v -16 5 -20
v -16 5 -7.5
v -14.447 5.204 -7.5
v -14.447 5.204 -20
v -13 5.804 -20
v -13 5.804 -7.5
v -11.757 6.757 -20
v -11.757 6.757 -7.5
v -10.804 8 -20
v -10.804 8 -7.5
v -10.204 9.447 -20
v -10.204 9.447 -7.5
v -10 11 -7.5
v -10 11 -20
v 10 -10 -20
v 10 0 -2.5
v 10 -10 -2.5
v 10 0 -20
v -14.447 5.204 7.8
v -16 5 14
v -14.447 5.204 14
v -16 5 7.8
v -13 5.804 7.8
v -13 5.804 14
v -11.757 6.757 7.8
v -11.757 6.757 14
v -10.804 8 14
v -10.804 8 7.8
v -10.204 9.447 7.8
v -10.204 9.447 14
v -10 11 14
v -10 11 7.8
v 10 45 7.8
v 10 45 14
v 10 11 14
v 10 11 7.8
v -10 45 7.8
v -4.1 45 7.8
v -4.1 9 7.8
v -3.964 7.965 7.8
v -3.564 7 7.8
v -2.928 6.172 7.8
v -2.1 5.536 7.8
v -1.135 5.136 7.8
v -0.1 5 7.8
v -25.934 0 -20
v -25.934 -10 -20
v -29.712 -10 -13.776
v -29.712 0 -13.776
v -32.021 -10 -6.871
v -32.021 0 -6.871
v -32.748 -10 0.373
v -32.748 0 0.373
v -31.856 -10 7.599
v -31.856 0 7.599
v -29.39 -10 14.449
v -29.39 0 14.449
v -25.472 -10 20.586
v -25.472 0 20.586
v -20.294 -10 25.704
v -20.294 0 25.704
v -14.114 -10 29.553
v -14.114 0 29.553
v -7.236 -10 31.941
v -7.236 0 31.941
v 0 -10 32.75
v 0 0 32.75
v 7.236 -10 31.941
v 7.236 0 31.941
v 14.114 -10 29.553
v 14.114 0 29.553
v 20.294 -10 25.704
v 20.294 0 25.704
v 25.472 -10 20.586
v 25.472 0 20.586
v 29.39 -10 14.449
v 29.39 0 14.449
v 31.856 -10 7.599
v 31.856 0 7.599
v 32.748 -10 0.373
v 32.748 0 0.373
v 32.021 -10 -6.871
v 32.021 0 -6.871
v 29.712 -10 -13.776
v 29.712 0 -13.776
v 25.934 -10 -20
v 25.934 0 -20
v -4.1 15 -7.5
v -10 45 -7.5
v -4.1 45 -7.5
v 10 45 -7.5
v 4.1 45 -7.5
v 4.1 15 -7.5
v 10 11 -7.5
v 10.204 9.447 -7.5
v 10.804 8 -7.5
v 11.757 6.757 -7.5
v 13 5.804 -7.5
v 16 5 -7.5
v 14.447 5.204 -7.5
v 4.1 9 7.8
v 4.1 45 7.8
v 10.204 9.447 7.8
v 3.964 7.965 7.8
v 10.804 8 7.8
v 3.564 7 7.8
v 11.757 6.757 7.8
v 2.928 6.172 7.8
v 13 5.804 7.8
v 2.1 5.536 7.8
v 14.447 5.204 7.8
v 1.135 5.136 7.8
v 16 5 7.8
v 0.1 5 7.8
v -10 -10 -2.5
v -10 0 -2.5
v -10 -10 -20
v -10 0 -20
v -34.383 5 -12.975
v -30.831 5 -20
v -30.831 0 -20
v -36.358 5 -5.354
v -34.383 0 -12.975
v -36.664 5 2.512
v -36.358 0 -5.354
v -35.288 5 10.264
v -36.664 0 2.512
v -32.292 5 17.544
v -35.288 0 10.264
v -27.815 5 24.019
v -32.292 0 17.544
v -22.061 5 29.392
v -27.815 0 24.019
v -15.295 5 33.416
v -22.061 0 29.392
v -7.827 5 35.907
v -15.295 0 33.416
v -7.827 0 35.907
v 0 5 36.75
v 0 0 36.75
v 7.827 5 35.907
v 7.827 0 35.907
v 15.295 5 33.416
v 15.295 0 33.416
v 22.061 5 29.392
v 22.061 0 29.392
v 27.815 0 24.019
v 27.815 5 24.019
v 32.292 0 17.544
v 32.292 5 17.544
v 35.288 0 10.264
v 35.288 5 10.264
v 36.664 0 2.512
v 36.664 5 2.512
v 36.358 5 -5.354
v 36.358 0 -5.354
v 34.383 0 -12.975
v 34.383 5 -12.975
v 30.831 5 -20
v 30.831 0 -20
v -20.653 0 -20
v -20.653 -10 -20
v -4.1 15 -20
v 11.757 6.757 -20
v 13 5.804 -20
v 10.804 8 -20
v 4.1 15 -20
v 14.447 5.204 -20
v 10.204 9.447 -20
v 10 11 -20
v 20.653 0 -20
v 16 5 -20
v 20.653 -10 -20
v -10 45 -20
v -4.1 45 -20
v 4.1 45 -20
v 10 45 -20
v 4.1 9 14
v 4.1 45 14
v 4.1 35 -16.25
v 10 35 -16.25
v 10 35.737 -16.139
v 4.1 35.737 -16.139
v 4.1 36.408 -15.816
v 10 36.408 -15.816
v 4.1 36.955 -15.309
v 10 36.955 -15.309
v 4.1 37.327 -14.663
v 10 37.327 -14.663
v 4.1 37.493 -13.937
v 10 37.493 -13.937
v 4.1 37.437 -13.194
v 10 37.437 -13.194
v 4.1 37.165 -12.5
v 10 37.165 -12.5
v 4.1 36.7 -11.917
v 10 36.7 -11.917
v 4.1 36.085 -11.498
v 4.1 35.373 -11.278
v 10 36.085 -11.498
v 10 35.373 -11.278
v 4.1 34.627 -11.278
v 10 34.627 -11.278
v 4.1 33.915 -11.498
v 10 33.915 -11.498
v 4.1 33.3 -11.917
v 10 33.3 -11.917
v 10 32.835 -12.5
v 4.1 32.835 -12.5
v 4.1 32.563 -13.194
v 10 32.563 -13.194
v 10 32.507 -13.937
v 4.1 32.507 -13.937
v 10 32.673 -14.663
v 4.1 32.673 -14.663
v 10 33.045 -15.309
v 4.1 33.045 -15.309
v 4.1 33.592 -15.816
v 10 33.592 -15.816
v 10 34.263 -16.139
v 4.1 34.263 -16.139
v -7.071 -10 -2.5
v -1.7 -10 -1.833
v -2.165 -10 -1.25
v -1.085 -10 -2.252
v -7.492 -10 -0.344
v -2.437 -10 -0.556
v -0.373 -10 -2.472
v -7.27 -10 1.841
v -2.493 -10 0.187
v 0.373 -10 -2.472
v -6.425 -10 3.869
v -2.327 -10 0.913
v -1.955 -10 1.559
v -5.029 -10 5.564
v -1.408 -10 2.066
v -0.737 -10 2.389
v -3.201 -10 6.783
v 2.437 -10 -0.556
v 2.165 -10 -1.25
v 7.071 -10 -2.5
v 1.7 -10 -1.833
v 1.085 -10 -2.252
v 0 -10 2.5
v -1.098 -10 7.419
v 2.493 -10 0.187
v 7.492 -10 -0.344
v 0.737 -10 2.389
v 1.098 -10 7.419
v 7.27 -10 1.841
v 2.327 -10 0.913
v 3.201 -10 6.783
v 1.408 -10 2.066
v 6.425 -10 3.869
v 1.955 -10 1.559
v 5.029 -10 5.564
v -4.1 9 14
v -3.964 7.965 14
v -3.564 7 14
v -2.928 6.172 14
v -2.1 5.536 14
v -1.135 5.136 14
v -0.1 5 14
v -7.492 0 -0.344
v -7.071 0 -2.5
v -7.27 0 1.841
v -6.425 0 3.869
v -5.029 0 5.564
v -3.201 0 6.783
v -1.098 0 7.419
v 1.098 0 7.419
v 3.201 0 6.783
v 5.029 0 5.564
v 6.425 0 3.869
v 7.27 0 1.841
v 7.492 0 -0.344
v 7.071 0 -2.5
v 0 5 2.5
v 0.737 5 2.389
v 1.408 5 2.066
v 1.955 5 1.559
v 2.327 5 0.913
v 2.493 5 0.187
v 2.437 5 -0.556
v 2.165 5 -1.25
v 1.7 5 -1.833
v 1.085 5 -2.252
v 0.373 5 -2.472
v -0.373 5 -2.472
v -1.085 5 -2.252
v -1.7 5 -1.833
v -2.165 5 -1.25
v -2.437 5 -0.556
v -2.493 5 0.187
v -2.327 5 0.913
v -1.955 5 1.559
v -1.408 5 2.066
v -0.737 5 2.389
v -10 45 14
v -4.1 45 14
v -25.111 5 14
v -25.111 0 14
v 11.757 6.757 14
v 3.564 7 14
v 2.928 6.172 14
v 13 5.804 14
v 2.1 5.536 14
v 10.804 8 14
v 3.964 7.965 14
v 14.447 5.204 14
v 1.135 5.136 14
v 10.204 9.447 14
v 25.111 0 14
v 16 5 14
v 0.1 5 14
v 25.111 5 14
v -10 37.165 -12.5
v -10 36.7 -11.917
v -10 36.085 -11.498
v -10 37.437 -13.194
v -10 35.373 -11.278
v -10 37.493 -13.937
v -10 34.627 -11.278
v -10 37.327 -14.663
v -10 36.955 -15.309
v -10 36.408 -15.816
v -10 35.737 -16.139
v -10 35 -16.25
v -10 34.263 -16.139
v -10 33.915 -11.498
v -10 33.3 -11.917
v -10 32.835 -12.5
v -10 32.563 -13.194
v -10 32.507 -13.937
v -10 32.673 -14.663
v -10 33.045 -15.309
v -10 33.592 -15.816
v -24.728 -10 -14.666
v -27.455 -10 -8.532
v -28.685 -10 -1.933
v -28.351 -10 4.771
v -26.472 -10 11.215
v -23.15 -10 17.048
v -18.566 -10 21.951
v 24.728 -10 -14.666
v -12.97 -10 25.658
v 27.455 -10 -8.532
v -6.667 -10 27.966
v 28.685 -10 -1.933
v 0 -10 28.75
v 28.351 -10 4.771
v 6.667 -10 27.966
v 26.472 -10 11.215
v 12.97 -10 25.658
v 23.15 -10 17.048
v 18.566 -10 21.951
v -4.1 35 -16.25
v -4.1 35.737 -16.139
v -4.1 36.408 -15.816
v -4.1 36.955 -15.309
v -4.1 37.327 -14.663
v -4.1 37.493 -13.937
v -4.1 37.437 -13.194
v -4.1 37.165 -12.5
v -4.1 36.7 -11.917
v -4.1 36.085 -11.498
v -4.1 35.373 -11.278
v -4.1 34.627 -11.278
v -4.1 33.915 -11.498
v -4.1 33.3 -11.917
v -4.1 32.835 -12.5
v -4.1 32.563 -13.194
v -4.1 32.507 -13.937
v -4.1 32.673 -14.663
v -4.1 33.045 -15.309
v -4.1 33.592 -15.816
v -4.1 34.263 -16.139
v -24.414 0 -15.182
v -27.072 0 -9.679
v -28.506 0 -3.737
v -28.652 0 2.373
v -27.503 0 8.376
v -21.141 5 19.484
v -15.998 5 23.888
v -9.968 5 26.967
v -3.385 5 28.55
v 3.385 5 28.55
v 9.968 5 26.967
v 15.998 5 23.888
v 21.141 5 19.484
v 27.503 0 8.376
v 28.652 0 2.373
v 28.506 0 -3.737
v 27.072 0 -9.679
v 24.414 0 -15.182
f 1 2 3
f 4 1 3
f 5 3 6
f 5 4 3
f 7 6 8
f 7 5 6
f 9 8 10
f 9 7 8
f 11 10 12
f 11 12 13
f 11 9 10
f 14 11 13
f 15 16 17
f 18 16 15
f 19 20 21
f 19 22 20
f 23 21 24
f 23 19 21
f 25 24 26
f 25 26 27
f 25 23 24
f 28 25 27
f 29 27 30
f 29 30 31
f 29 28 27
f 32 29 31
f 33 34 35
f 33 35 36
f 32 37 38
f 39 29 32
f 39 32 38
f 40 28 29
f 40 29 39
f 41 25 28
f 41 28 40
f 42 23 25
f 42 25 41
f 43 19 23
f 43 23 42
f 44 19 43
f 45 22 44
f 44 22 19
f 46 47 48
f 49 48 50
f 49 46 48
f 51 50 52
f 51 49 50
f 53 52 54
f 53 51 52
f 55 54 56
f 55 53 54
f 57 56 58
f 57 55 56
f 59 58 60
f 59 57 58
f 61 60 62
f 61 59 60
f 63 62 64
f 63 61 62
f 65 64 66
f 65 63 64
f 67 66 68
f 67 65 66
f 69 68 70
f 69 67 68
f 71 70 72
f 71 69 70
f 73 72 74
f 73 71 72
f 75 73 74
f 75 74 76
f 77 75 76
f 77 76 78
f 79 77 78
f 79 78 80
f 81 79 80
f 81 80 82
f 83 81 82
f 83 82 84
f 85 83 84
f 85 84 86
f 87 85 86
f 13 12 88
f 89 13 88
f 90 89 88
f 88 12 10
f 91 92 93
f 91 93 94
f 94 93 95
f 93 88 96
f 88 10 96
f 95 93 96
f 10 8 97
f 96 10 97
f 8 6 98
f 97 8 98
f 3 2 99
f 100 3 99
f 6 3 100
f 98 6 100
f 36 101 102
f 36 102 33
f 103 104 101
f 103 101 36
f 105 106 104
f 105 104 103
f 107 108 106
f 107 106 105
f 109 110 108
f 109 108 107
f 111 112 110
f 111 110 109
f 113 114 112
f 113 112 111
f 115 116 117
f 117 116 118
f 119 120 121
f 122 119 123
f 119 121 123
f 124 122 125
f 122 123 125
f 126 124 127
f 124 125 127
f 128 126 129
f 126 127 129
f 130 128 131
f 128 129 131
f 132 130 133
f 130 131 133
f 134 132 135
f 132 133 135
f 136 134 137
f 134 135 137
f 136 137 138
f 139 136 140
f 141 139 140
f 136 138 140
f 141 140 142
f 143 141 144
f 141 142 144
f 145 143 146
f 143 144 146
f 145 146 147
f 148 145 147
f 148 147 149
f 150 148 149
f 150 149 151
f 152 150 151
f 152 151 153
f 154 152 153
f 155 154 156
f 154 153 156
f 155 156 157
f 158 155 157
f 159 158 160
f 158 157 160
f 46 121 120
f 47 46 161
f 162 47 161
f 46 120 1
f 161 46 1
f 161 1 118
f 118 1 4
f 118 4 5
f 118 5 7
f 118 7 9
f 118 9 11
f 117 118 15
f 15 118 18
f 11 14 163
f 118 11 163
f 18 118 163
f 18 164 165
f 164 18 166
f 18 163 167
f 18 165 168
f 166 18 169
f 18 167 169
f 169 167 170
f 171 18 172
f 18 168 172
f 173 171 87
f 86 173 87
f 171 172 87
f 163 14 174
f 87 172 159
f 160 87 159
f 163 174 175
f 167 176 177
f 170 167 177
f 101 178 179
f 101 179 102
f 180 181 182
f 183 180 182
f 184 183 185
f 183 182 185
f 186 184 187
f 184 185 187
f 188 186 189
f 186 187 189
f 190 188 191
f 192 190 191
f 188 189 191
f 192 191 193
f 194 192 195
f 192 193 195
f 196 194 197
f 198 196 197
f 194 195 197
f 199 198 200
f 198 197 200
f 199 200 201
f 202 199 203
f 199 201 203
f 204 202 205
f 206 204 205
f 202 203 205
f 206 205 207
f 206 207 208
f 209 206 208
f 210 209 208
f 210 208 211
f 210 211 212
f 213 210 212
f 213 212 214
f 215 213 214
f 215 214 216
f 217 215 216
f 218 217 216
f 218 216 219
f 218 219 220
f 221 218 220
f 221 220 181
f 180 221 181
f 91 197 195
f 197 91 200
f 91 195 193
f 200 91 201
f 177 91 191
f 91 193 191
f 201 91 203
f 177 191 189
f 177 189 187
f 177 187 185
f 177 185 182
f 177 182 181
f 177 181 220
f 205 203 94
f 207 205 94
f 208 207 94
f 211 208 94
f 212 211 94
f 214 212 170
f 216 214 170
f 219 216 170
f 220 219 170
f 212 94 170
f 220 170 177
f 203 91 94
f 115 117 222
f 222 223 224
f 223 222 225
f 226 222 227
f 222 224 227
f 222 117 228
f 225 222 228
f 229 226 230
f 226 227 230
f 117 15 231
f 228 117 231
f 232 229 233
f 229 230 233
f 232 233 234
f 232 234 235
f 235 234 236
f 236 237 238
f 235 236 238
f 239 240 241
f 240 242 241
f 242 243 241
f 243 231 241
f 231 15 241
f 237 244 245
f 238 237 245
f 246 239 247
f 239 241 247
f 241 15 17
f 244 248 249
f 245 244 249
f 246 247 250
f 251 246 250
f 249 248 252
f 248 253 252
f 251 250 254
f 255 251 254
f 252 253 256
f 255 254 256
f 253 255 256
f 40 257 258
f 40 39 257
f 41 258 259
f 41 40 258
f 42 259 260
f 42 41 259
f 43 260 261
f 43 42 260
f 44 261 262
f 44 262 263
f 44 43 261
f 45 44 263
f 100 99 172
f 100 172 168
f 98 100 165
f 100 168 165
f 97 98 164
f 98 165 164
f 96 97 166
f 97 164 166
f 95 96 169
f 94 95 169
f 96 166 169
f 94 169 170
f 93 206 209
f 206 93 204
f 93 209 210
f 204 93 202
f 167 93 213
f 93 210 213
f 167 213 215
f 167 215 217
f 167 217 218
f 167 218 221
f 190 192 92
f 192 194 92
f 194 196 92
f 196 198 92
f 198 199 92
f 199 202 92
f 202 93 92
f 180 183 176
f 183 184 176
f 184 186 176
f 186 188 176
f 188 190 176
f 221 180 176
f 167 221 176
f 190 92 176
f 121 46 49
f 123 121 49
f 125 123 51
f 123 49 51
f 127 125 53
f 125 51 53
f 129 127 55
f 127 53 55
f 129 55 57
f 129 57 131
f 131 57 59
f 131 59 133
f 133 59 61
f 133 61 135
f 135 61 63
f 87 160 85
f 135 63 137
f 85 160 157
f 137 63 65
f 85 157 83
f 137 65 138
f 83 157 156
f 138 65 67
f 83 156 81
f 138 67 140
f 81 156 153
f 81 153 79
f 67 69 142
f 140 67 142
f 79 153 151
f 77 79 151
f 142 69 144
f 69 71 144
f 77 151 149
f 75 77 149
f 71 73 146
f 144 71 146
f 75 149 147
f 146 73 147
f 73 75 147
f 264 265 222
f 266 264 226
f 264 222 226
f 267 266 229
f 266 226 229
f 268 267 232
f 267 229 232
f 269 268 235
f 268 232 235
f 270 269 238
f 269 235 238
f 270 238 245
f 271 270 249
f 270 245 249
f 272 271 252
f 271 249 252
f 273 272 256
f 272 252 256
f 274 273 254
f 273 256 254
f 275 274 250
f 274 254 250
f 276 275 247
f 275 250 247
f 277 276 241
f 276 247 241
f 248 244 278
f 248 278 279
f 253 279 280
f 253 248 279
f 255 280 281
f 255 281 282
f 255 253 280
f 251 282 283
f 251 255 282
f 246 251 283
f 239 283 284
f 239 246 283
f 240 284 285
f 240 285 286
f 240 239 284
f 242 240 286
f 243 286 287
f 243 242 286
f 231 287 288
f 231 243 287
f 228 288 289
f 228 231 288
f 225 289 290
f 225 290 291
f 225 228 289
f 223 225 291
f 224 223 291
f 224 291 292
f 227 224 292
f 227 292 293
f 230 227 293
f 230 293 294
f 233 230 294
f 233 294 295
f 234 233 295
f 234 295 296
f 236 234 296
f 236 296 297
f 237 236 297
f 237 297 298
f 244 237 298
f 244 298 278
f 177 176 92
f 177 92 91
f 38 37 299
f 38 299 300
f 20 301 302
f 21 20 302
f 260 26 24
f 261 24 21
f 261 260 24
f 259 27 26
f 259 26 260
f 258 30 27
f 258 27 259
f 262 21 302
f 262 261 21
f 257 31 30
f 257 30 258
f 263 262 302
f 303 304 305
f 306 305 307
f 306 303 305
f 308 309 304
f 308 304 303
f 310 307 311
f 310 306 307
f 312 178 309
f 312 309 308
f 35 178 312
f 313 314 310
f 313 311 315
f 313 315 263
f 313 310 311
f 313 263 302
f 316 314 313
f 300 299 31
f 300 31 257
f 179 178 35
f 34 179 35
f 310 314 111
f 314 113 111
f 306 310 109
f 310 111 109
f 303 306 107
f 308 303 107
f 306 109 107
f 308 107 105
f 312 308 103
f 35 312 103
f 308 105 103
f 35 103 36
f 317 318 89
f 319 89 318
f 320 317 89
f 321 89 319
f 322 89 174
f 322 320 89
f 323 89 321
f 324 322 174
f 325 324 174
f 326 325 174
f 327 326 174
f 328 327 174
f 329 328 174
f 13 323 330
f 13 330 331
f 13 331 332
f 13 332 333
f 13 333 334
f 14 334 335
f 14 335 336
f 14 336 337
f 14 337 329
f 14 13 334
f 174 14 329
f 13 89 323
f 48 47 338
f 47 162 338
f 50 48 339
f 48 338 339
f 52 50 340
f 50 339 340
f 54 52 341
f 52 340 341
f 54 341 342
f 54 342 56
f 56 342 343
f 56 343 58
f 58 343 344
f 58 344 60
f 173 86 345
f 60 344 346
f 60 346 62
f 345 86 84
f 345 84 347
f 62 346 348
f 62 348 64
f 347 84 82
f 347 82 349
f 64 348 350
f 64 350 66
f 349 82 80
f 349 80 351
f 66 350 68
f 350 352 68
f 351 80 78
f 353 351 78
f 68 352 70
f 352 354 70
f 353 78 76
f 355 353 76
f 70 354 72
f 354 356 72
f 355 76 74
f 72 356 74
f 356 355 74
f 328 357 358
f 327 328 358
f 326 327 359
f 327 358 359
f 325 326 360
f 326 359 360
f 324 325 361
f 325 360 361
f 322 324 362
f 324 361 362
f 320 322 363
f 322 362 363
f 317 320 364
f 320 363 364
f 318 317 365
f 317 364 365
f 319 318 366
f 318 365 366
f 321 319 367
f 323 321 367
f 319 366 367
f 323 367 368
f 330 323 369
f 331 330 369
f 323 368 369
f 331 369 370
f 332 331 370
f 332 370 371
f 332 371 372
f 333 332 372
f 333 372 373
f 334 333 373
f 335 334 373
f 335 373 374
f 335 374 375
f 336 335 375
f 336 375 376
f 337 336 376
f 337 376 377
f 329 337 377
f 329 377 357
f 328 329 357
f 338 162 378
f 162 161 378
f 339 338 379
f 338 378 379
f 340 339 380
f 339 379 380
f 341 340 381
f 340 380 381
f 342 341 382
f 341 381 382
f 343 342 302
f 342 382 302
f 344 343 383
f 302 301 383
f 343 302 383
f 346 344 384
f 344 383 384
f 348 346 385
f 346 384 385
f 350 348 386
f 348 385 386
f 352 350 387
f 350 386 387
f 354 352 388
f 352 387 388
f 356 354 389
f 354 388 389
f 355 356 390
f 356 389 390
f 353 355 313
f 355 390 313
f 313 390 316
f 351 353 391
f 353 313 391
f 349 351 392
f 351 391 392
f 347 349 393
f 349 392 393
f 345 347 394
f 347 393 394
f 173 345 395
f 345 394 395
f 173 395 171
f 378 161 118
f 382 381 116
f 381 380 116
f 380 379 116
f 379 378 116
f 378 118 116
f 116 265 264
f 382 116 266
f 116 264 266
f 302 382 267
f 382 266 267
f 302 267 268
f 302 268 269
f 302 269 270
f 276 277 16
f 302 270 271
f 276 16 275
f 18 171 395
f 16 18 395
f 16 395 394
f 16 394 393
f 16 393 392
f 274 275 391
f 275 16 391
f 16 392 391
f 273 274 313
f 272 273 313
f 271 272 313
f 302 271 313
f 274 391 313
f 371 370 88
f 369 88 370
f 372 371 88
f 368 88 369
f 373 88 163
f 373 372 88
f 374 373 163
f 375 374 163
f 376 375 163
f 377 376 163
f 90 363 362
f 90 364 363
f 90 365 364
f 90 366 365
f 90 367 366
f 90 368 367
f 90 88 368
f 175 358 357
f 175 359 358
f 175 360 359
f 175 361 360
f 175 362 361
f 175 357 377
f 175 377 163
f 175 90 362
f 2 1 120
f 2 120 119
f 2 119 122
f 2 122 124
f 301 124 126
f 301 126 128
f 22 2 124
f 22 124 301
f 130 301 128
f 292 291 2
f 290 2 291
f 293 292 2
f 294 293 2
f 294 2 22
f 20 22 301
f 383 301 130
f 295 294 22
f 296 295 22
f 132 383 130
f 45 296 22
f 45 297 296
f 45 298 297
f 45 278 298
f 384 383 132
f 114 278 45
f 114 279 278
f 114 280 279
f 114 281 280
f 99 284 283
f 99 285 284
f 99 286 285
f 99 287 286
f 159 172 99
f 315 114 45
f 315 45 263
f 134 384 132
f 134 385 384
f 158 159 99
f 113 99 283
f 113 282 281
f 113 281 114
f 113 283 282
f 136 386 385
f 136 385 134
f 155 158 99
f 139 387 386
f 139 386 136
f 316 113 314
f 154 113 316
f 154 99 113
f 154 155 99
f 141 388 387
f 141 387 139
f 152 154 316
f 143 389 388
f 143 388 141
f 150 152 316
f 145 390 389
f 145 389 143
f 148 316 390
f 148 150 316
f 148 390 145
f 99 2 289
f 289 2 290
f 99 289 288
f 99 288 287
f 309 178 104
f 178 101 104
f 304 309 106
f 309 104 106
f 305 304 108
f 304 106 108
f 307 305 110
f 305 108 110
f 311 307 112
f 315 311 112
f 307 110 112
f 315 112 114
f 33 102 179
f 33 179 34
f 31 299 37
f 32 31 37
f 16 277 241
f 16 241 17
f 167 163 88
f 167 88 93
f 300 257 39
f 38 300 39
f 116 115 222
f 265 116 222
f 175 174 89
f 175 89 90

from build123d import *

# Parameters (mm, degrees)
CYLINDER_DEPTH                  = 5
CYLINDER_DEPTH_BACK             = 10
SKETCH_1_R                      = 7.5
SKETCH_1_R_2                    = 2.5
SKETCH_2_R                      = 36.75
SKETCH_2_R_2                    = 2.5
BASE_HORIZONT_DEPTH             = 5
SKETCH_3_R                      = 32.75
SKETCH_3_R_2                    = 28.75
EDGE_2_DEPTH                    = 15
SKETCH_4_W                      = 20
SKETCH_4_H                      = 17.5
RECTANGLE_DEPTH                 = 40
RECTANGLE_DIRECTION_2_REACH     = 56.094
SKETCH_6_W                      = 8.2
SKETCH_6_H                      = 17.5
CUT_EXTRUDE_5_DEPTH             = 30
CUT_EXTRUDE_6_REACH             = 76.573
SKETCH_7_R                      = 2.5
CUT_EXTRUDE_7_REACH             = 70.747
SKETCH_8_W                      = 61.662387238
SKETCH_8_H                      = 16.75
CUT_EXTRUDE_7_DIRECTION_2_REACH = 70.747
CUT_EXTRUDE_START               = -40
SKETCH_9_W                      = 20
SKETCH_9_H                      = 5
CUT_EXTRUDE_8_DEPTH             = 40
PIE_REACH                       = 67.583
SKETCH_11_W                     = 5.9
SKETCH_11_H                     = 6.2
EXTRUDE_9_DEPTH                 = 40
FILLET_4_R                      = 6
FILLET_5_R                      = 4


with BuildPart() as part:
    # Эскиз1 → cylinder (new, two sides: drawn at the far end of the back side and taken through both)
    with BuildSketch(Plane(origin=(0, 0, 0), x_dir=(1, 0, 0), z_dir=(0, 1, 0)).offset(-CYLINDER_DEPTH_BACK)):
        with Locations(Location((0, 0, 0), (0, 0, 270))):
            Circle(SKETCH_1_R)
        with Locations(Location((0, 0, 0), (0, 0, 270))):
            Circle(SKETCH_1_R_2, mode=Mode.SUBTRACT)
    extrude(amount=CYLINDER_DEPTH + CYLINDER_DEPTH_BACK)

    # Эскиз2 → base horizont (add)
    with BuildSketch(Plane(origin=(0, 0, 0), x_dir=(1, 0, 0), z_dir=(0, 1, 0))):
        with Locations(Location((0, 0, 0), (0, 0, 270))):
            Circle(SKETCH_2_R)
        with Locations(Location((0, 0, 0), (0, 0, 270))):
            Circle(SKETCH_2_R_2, mode=Mode.SUBTRACT)
    extrude(amount=BASE_HORIZONT_DEPTH)

    # Эскиз3 → edge 2 (add)
    with BuildSketch(Plane(origin=(0, 5, 0), x_dir=(1, 0, 0), z_dir=(0, 1, 0))):
        with Locations(Location((0, 0, 0), (0, 0, 270))):
            Circle(SKETCH_3_R)
        with Locations(Location((0, 0, 0), (0, 0, 270))):
            Circle(SKETCH_3_R_2, mode=Mode.SUBTRACT)
    extrude(amount=-EDGE_2_DEPTH)

    # Эскиз4 → rectangle (add)
    with BuildSketch(Plane(origin=(0, 5, 0), x_dir=(1, 0, 0), z_dir=(0, 1, 0))):
        with Locations((0, 11.25)):
            Rectangle(SKETCH_4_W, SKETCH_4_H)
    extrude(amount=RECTANGLE_DEPTH)

    # rectangle direction 2: up to this face of the body (flat: up to its plane)
    rectangle_direction_2_end = Plane(part.part.faces().sort_by_distance((0, -10, -31.823690117))[0])
    # Эскиз4 → rectangle direction 2 (add, up to the picked face)
    with BuildSketch(Plane(origin=(0, 5, 0), x_dir=(1, 0, 0), z_dir=(0, 1, 0)), mode=Mode.PRIVATE) as rectangle_direction_2_sk1:
        with Locations((0, 11.25)):
            Rectangle(SKETCH_4_W, SKETCH_4_H)
    rectangle_direction_2_tool1 = split(extrude(rectangle_direction_2_sk1.sketch, amount=-RECTANGLE_DIRECTION_2_REACH, mode=Mode.PRIVATE), bisect_by=rectangle_direction_2_end, keep=Keep.BOTH, mode=Mode.PRIVATE)
    add(rectangle_direction_2_tool1.solids().sort_by(Axis((0, 5, -11.25), (0, -1, 0)))[0])

    # Эскиз6 → Вытянуть5 (cut)
    with BuildSketch(Plane(origin=(0, 45, 0), x_dir=(1, 0, 0), z_dir=(0, 1, 0))):
        with Locations((0, 11.25)):
            Rectangle(SKETCH_6_W, SKETCH_6_H)
    extrude(amount=-CUT_EXTRUDE_5_DEPTH, mode=Mode.SUBTRACT)

    # Вытянуть6: up to this face of the body (flat: up to its plane)
    cut_extrude_6_end = Plane(part.part.faces().sort_by_distance((-10, 25, -11.25))[0])
    # Эскиз7 → Вытянуть6 (cut, up to the picked face)
    with BuildSketch(Plane(origin=(10, 0, 0), x_dir=(0, 0, -1), z_dir=(1, 0, 0)), mode=Mode.PRIVATE) as cut_extrude_6_sk1:
        with Locations((13.75, 35)):
            Circle(SKETCH_7_R)
    cut_extrude_6_tool1 = split(extrude(cut_extrude_6_sk1.sketch, amount=-CUT_EXTRUDE_6_REACH, mode=Mode.PRIVATE), bisect_by=cut_extrude_6_end, keep=Keep.BOTH, mode=Mode.PRIVATE)
    add(cut_extrude_6_tool1.solids().sort_by(Axis((10, 35, -13.75), (-1, 0, 0)))[0], mode=Mode.SUBTRACT)

    # Эскиз8 → Вытянуть7 (cut, up to next)
    with BuildSketch(Plane(origin=(0, 0, 0), x_dir=(1, 0, 0), z_dir=(0, 1, 0)), mode=Mode.PRIVATE) as cut_extrude_7_sk1:
        with Locations((0, 28.375)):
            Rectangle(SKETCH_8_W, SKETCH_8_H)
    cut_extrude_7_tool1 = extrude(cut_extrude_7_sk1.sketch, amount=CUT_EXTRUDE_7_REACH, mode=Mode.PRIVATE) & part.part
    add(cut_extrude_7_tool1.solids().sort_by_distance((0, 0, -28.375))[0], mode=Mode.SUBTRACT)

    # Эскиз8 → Вытянуть7 direction 2 (cut, up to next)
    with BuildSketch(Plane(origin=(0, 0, 0), x_dir=(1, 0, 0), z_dir=(0, 1, 0)), mode=Mode.PRIVATE) as cut_extrude_7_direction_2_sk1:
        with Locations((0, 28.375)):
            Rectangle(SKETCH_8_W, SKETCH_8_H)
    cut_extrude_7_direction_2_tool1 = extrude(cut_extrude_7_direction_2_sk1.sketch, amount=-CUT_EXTRUDE_7_DIRECTION_2_REACH, mode=Mode.PRIVATE) & part.part
    add(cut_extrude_7_direction_2_tool1.solids().sort_by_distance((0, 0, -28.375))[0], mode=Mode.SUBTRACT)

    # Эскиз9 → Вытянуть8 (cut)
    with BuildSketch(Plane(origin=(0, 45, 0), x_dir=(1, 0, 0), z_dir=(0, 1, 0)).offset(CUT_EXTRUDE_START)):
        with Locations((0, 5)):
            Rectangle(SKETCH_9_W, SKETCH_9_H)
    extrude(amount=CUT_EXTRUDE_8_DEPTH, mode=Mode.SUBTRACT)

    # Эскиз10 → pie (cut, up to next)
    with BuildSketch(Plane(origin=(0, 5, 0), x_dir=(1, 0, 0), z_dir=(0, 1, 0)), mode=Mode.PRIVATE) as pie_sk1:
        with BuildLine():
            Line((-25.111003564, -14), (25.111003564, -14))
            ThreePointArc((25.111003564, -14), (0, -28.75), (-25.111003564, -14))
        make_face()
    pie_tool1 = extrude(pie_sk1.sketch, amount=-PIE_REACH, mode=Mode.PRIVATE) & part.part
    add(pie_tool1.solids().sort_by_distance((0, 5, 20.052651))[0], mode=Mode.SUBTRACT)

    # Эскиз11 → Вытянуть9 (add)
    with BuildSketch(Plane(origin=(0, 5, 0), x_dir=(1, 0, 0), z_dir=(0, 1, 0))):
        with Locations((-7.05, -10.9)):
            Rectangle(SKETCH_11_W, SKETCH_11_H)
        with Locations((7.05, -10.9)):
            Rectangle(SKETCH_11_W, SKETCH_11_H)
    extrude(amount=EXTRUDE_9_DEPTH)

    # Скругление4
    fillet_4_edges = [part.edges().sort_by_distance(p)[0] for p in [
        (10, 5, -13.75),
        (-10, 5, 10.9),
        (10, 5, 10.9),
        (-10, 5, -13.75),
    ]]
    fillet(fillet_4_edges, radius=FILLET_4_R)

    # Скругление5
    fillet_5_edges = [part.edges().sort_by_distance(p)[0] for p in [
        (-4.1, 5, 10.9),
        (4.1, 5, 10.9),
    ]]
    fillet(fillet_5_edges, radius=FILLET_5_R)


solid = part.part
